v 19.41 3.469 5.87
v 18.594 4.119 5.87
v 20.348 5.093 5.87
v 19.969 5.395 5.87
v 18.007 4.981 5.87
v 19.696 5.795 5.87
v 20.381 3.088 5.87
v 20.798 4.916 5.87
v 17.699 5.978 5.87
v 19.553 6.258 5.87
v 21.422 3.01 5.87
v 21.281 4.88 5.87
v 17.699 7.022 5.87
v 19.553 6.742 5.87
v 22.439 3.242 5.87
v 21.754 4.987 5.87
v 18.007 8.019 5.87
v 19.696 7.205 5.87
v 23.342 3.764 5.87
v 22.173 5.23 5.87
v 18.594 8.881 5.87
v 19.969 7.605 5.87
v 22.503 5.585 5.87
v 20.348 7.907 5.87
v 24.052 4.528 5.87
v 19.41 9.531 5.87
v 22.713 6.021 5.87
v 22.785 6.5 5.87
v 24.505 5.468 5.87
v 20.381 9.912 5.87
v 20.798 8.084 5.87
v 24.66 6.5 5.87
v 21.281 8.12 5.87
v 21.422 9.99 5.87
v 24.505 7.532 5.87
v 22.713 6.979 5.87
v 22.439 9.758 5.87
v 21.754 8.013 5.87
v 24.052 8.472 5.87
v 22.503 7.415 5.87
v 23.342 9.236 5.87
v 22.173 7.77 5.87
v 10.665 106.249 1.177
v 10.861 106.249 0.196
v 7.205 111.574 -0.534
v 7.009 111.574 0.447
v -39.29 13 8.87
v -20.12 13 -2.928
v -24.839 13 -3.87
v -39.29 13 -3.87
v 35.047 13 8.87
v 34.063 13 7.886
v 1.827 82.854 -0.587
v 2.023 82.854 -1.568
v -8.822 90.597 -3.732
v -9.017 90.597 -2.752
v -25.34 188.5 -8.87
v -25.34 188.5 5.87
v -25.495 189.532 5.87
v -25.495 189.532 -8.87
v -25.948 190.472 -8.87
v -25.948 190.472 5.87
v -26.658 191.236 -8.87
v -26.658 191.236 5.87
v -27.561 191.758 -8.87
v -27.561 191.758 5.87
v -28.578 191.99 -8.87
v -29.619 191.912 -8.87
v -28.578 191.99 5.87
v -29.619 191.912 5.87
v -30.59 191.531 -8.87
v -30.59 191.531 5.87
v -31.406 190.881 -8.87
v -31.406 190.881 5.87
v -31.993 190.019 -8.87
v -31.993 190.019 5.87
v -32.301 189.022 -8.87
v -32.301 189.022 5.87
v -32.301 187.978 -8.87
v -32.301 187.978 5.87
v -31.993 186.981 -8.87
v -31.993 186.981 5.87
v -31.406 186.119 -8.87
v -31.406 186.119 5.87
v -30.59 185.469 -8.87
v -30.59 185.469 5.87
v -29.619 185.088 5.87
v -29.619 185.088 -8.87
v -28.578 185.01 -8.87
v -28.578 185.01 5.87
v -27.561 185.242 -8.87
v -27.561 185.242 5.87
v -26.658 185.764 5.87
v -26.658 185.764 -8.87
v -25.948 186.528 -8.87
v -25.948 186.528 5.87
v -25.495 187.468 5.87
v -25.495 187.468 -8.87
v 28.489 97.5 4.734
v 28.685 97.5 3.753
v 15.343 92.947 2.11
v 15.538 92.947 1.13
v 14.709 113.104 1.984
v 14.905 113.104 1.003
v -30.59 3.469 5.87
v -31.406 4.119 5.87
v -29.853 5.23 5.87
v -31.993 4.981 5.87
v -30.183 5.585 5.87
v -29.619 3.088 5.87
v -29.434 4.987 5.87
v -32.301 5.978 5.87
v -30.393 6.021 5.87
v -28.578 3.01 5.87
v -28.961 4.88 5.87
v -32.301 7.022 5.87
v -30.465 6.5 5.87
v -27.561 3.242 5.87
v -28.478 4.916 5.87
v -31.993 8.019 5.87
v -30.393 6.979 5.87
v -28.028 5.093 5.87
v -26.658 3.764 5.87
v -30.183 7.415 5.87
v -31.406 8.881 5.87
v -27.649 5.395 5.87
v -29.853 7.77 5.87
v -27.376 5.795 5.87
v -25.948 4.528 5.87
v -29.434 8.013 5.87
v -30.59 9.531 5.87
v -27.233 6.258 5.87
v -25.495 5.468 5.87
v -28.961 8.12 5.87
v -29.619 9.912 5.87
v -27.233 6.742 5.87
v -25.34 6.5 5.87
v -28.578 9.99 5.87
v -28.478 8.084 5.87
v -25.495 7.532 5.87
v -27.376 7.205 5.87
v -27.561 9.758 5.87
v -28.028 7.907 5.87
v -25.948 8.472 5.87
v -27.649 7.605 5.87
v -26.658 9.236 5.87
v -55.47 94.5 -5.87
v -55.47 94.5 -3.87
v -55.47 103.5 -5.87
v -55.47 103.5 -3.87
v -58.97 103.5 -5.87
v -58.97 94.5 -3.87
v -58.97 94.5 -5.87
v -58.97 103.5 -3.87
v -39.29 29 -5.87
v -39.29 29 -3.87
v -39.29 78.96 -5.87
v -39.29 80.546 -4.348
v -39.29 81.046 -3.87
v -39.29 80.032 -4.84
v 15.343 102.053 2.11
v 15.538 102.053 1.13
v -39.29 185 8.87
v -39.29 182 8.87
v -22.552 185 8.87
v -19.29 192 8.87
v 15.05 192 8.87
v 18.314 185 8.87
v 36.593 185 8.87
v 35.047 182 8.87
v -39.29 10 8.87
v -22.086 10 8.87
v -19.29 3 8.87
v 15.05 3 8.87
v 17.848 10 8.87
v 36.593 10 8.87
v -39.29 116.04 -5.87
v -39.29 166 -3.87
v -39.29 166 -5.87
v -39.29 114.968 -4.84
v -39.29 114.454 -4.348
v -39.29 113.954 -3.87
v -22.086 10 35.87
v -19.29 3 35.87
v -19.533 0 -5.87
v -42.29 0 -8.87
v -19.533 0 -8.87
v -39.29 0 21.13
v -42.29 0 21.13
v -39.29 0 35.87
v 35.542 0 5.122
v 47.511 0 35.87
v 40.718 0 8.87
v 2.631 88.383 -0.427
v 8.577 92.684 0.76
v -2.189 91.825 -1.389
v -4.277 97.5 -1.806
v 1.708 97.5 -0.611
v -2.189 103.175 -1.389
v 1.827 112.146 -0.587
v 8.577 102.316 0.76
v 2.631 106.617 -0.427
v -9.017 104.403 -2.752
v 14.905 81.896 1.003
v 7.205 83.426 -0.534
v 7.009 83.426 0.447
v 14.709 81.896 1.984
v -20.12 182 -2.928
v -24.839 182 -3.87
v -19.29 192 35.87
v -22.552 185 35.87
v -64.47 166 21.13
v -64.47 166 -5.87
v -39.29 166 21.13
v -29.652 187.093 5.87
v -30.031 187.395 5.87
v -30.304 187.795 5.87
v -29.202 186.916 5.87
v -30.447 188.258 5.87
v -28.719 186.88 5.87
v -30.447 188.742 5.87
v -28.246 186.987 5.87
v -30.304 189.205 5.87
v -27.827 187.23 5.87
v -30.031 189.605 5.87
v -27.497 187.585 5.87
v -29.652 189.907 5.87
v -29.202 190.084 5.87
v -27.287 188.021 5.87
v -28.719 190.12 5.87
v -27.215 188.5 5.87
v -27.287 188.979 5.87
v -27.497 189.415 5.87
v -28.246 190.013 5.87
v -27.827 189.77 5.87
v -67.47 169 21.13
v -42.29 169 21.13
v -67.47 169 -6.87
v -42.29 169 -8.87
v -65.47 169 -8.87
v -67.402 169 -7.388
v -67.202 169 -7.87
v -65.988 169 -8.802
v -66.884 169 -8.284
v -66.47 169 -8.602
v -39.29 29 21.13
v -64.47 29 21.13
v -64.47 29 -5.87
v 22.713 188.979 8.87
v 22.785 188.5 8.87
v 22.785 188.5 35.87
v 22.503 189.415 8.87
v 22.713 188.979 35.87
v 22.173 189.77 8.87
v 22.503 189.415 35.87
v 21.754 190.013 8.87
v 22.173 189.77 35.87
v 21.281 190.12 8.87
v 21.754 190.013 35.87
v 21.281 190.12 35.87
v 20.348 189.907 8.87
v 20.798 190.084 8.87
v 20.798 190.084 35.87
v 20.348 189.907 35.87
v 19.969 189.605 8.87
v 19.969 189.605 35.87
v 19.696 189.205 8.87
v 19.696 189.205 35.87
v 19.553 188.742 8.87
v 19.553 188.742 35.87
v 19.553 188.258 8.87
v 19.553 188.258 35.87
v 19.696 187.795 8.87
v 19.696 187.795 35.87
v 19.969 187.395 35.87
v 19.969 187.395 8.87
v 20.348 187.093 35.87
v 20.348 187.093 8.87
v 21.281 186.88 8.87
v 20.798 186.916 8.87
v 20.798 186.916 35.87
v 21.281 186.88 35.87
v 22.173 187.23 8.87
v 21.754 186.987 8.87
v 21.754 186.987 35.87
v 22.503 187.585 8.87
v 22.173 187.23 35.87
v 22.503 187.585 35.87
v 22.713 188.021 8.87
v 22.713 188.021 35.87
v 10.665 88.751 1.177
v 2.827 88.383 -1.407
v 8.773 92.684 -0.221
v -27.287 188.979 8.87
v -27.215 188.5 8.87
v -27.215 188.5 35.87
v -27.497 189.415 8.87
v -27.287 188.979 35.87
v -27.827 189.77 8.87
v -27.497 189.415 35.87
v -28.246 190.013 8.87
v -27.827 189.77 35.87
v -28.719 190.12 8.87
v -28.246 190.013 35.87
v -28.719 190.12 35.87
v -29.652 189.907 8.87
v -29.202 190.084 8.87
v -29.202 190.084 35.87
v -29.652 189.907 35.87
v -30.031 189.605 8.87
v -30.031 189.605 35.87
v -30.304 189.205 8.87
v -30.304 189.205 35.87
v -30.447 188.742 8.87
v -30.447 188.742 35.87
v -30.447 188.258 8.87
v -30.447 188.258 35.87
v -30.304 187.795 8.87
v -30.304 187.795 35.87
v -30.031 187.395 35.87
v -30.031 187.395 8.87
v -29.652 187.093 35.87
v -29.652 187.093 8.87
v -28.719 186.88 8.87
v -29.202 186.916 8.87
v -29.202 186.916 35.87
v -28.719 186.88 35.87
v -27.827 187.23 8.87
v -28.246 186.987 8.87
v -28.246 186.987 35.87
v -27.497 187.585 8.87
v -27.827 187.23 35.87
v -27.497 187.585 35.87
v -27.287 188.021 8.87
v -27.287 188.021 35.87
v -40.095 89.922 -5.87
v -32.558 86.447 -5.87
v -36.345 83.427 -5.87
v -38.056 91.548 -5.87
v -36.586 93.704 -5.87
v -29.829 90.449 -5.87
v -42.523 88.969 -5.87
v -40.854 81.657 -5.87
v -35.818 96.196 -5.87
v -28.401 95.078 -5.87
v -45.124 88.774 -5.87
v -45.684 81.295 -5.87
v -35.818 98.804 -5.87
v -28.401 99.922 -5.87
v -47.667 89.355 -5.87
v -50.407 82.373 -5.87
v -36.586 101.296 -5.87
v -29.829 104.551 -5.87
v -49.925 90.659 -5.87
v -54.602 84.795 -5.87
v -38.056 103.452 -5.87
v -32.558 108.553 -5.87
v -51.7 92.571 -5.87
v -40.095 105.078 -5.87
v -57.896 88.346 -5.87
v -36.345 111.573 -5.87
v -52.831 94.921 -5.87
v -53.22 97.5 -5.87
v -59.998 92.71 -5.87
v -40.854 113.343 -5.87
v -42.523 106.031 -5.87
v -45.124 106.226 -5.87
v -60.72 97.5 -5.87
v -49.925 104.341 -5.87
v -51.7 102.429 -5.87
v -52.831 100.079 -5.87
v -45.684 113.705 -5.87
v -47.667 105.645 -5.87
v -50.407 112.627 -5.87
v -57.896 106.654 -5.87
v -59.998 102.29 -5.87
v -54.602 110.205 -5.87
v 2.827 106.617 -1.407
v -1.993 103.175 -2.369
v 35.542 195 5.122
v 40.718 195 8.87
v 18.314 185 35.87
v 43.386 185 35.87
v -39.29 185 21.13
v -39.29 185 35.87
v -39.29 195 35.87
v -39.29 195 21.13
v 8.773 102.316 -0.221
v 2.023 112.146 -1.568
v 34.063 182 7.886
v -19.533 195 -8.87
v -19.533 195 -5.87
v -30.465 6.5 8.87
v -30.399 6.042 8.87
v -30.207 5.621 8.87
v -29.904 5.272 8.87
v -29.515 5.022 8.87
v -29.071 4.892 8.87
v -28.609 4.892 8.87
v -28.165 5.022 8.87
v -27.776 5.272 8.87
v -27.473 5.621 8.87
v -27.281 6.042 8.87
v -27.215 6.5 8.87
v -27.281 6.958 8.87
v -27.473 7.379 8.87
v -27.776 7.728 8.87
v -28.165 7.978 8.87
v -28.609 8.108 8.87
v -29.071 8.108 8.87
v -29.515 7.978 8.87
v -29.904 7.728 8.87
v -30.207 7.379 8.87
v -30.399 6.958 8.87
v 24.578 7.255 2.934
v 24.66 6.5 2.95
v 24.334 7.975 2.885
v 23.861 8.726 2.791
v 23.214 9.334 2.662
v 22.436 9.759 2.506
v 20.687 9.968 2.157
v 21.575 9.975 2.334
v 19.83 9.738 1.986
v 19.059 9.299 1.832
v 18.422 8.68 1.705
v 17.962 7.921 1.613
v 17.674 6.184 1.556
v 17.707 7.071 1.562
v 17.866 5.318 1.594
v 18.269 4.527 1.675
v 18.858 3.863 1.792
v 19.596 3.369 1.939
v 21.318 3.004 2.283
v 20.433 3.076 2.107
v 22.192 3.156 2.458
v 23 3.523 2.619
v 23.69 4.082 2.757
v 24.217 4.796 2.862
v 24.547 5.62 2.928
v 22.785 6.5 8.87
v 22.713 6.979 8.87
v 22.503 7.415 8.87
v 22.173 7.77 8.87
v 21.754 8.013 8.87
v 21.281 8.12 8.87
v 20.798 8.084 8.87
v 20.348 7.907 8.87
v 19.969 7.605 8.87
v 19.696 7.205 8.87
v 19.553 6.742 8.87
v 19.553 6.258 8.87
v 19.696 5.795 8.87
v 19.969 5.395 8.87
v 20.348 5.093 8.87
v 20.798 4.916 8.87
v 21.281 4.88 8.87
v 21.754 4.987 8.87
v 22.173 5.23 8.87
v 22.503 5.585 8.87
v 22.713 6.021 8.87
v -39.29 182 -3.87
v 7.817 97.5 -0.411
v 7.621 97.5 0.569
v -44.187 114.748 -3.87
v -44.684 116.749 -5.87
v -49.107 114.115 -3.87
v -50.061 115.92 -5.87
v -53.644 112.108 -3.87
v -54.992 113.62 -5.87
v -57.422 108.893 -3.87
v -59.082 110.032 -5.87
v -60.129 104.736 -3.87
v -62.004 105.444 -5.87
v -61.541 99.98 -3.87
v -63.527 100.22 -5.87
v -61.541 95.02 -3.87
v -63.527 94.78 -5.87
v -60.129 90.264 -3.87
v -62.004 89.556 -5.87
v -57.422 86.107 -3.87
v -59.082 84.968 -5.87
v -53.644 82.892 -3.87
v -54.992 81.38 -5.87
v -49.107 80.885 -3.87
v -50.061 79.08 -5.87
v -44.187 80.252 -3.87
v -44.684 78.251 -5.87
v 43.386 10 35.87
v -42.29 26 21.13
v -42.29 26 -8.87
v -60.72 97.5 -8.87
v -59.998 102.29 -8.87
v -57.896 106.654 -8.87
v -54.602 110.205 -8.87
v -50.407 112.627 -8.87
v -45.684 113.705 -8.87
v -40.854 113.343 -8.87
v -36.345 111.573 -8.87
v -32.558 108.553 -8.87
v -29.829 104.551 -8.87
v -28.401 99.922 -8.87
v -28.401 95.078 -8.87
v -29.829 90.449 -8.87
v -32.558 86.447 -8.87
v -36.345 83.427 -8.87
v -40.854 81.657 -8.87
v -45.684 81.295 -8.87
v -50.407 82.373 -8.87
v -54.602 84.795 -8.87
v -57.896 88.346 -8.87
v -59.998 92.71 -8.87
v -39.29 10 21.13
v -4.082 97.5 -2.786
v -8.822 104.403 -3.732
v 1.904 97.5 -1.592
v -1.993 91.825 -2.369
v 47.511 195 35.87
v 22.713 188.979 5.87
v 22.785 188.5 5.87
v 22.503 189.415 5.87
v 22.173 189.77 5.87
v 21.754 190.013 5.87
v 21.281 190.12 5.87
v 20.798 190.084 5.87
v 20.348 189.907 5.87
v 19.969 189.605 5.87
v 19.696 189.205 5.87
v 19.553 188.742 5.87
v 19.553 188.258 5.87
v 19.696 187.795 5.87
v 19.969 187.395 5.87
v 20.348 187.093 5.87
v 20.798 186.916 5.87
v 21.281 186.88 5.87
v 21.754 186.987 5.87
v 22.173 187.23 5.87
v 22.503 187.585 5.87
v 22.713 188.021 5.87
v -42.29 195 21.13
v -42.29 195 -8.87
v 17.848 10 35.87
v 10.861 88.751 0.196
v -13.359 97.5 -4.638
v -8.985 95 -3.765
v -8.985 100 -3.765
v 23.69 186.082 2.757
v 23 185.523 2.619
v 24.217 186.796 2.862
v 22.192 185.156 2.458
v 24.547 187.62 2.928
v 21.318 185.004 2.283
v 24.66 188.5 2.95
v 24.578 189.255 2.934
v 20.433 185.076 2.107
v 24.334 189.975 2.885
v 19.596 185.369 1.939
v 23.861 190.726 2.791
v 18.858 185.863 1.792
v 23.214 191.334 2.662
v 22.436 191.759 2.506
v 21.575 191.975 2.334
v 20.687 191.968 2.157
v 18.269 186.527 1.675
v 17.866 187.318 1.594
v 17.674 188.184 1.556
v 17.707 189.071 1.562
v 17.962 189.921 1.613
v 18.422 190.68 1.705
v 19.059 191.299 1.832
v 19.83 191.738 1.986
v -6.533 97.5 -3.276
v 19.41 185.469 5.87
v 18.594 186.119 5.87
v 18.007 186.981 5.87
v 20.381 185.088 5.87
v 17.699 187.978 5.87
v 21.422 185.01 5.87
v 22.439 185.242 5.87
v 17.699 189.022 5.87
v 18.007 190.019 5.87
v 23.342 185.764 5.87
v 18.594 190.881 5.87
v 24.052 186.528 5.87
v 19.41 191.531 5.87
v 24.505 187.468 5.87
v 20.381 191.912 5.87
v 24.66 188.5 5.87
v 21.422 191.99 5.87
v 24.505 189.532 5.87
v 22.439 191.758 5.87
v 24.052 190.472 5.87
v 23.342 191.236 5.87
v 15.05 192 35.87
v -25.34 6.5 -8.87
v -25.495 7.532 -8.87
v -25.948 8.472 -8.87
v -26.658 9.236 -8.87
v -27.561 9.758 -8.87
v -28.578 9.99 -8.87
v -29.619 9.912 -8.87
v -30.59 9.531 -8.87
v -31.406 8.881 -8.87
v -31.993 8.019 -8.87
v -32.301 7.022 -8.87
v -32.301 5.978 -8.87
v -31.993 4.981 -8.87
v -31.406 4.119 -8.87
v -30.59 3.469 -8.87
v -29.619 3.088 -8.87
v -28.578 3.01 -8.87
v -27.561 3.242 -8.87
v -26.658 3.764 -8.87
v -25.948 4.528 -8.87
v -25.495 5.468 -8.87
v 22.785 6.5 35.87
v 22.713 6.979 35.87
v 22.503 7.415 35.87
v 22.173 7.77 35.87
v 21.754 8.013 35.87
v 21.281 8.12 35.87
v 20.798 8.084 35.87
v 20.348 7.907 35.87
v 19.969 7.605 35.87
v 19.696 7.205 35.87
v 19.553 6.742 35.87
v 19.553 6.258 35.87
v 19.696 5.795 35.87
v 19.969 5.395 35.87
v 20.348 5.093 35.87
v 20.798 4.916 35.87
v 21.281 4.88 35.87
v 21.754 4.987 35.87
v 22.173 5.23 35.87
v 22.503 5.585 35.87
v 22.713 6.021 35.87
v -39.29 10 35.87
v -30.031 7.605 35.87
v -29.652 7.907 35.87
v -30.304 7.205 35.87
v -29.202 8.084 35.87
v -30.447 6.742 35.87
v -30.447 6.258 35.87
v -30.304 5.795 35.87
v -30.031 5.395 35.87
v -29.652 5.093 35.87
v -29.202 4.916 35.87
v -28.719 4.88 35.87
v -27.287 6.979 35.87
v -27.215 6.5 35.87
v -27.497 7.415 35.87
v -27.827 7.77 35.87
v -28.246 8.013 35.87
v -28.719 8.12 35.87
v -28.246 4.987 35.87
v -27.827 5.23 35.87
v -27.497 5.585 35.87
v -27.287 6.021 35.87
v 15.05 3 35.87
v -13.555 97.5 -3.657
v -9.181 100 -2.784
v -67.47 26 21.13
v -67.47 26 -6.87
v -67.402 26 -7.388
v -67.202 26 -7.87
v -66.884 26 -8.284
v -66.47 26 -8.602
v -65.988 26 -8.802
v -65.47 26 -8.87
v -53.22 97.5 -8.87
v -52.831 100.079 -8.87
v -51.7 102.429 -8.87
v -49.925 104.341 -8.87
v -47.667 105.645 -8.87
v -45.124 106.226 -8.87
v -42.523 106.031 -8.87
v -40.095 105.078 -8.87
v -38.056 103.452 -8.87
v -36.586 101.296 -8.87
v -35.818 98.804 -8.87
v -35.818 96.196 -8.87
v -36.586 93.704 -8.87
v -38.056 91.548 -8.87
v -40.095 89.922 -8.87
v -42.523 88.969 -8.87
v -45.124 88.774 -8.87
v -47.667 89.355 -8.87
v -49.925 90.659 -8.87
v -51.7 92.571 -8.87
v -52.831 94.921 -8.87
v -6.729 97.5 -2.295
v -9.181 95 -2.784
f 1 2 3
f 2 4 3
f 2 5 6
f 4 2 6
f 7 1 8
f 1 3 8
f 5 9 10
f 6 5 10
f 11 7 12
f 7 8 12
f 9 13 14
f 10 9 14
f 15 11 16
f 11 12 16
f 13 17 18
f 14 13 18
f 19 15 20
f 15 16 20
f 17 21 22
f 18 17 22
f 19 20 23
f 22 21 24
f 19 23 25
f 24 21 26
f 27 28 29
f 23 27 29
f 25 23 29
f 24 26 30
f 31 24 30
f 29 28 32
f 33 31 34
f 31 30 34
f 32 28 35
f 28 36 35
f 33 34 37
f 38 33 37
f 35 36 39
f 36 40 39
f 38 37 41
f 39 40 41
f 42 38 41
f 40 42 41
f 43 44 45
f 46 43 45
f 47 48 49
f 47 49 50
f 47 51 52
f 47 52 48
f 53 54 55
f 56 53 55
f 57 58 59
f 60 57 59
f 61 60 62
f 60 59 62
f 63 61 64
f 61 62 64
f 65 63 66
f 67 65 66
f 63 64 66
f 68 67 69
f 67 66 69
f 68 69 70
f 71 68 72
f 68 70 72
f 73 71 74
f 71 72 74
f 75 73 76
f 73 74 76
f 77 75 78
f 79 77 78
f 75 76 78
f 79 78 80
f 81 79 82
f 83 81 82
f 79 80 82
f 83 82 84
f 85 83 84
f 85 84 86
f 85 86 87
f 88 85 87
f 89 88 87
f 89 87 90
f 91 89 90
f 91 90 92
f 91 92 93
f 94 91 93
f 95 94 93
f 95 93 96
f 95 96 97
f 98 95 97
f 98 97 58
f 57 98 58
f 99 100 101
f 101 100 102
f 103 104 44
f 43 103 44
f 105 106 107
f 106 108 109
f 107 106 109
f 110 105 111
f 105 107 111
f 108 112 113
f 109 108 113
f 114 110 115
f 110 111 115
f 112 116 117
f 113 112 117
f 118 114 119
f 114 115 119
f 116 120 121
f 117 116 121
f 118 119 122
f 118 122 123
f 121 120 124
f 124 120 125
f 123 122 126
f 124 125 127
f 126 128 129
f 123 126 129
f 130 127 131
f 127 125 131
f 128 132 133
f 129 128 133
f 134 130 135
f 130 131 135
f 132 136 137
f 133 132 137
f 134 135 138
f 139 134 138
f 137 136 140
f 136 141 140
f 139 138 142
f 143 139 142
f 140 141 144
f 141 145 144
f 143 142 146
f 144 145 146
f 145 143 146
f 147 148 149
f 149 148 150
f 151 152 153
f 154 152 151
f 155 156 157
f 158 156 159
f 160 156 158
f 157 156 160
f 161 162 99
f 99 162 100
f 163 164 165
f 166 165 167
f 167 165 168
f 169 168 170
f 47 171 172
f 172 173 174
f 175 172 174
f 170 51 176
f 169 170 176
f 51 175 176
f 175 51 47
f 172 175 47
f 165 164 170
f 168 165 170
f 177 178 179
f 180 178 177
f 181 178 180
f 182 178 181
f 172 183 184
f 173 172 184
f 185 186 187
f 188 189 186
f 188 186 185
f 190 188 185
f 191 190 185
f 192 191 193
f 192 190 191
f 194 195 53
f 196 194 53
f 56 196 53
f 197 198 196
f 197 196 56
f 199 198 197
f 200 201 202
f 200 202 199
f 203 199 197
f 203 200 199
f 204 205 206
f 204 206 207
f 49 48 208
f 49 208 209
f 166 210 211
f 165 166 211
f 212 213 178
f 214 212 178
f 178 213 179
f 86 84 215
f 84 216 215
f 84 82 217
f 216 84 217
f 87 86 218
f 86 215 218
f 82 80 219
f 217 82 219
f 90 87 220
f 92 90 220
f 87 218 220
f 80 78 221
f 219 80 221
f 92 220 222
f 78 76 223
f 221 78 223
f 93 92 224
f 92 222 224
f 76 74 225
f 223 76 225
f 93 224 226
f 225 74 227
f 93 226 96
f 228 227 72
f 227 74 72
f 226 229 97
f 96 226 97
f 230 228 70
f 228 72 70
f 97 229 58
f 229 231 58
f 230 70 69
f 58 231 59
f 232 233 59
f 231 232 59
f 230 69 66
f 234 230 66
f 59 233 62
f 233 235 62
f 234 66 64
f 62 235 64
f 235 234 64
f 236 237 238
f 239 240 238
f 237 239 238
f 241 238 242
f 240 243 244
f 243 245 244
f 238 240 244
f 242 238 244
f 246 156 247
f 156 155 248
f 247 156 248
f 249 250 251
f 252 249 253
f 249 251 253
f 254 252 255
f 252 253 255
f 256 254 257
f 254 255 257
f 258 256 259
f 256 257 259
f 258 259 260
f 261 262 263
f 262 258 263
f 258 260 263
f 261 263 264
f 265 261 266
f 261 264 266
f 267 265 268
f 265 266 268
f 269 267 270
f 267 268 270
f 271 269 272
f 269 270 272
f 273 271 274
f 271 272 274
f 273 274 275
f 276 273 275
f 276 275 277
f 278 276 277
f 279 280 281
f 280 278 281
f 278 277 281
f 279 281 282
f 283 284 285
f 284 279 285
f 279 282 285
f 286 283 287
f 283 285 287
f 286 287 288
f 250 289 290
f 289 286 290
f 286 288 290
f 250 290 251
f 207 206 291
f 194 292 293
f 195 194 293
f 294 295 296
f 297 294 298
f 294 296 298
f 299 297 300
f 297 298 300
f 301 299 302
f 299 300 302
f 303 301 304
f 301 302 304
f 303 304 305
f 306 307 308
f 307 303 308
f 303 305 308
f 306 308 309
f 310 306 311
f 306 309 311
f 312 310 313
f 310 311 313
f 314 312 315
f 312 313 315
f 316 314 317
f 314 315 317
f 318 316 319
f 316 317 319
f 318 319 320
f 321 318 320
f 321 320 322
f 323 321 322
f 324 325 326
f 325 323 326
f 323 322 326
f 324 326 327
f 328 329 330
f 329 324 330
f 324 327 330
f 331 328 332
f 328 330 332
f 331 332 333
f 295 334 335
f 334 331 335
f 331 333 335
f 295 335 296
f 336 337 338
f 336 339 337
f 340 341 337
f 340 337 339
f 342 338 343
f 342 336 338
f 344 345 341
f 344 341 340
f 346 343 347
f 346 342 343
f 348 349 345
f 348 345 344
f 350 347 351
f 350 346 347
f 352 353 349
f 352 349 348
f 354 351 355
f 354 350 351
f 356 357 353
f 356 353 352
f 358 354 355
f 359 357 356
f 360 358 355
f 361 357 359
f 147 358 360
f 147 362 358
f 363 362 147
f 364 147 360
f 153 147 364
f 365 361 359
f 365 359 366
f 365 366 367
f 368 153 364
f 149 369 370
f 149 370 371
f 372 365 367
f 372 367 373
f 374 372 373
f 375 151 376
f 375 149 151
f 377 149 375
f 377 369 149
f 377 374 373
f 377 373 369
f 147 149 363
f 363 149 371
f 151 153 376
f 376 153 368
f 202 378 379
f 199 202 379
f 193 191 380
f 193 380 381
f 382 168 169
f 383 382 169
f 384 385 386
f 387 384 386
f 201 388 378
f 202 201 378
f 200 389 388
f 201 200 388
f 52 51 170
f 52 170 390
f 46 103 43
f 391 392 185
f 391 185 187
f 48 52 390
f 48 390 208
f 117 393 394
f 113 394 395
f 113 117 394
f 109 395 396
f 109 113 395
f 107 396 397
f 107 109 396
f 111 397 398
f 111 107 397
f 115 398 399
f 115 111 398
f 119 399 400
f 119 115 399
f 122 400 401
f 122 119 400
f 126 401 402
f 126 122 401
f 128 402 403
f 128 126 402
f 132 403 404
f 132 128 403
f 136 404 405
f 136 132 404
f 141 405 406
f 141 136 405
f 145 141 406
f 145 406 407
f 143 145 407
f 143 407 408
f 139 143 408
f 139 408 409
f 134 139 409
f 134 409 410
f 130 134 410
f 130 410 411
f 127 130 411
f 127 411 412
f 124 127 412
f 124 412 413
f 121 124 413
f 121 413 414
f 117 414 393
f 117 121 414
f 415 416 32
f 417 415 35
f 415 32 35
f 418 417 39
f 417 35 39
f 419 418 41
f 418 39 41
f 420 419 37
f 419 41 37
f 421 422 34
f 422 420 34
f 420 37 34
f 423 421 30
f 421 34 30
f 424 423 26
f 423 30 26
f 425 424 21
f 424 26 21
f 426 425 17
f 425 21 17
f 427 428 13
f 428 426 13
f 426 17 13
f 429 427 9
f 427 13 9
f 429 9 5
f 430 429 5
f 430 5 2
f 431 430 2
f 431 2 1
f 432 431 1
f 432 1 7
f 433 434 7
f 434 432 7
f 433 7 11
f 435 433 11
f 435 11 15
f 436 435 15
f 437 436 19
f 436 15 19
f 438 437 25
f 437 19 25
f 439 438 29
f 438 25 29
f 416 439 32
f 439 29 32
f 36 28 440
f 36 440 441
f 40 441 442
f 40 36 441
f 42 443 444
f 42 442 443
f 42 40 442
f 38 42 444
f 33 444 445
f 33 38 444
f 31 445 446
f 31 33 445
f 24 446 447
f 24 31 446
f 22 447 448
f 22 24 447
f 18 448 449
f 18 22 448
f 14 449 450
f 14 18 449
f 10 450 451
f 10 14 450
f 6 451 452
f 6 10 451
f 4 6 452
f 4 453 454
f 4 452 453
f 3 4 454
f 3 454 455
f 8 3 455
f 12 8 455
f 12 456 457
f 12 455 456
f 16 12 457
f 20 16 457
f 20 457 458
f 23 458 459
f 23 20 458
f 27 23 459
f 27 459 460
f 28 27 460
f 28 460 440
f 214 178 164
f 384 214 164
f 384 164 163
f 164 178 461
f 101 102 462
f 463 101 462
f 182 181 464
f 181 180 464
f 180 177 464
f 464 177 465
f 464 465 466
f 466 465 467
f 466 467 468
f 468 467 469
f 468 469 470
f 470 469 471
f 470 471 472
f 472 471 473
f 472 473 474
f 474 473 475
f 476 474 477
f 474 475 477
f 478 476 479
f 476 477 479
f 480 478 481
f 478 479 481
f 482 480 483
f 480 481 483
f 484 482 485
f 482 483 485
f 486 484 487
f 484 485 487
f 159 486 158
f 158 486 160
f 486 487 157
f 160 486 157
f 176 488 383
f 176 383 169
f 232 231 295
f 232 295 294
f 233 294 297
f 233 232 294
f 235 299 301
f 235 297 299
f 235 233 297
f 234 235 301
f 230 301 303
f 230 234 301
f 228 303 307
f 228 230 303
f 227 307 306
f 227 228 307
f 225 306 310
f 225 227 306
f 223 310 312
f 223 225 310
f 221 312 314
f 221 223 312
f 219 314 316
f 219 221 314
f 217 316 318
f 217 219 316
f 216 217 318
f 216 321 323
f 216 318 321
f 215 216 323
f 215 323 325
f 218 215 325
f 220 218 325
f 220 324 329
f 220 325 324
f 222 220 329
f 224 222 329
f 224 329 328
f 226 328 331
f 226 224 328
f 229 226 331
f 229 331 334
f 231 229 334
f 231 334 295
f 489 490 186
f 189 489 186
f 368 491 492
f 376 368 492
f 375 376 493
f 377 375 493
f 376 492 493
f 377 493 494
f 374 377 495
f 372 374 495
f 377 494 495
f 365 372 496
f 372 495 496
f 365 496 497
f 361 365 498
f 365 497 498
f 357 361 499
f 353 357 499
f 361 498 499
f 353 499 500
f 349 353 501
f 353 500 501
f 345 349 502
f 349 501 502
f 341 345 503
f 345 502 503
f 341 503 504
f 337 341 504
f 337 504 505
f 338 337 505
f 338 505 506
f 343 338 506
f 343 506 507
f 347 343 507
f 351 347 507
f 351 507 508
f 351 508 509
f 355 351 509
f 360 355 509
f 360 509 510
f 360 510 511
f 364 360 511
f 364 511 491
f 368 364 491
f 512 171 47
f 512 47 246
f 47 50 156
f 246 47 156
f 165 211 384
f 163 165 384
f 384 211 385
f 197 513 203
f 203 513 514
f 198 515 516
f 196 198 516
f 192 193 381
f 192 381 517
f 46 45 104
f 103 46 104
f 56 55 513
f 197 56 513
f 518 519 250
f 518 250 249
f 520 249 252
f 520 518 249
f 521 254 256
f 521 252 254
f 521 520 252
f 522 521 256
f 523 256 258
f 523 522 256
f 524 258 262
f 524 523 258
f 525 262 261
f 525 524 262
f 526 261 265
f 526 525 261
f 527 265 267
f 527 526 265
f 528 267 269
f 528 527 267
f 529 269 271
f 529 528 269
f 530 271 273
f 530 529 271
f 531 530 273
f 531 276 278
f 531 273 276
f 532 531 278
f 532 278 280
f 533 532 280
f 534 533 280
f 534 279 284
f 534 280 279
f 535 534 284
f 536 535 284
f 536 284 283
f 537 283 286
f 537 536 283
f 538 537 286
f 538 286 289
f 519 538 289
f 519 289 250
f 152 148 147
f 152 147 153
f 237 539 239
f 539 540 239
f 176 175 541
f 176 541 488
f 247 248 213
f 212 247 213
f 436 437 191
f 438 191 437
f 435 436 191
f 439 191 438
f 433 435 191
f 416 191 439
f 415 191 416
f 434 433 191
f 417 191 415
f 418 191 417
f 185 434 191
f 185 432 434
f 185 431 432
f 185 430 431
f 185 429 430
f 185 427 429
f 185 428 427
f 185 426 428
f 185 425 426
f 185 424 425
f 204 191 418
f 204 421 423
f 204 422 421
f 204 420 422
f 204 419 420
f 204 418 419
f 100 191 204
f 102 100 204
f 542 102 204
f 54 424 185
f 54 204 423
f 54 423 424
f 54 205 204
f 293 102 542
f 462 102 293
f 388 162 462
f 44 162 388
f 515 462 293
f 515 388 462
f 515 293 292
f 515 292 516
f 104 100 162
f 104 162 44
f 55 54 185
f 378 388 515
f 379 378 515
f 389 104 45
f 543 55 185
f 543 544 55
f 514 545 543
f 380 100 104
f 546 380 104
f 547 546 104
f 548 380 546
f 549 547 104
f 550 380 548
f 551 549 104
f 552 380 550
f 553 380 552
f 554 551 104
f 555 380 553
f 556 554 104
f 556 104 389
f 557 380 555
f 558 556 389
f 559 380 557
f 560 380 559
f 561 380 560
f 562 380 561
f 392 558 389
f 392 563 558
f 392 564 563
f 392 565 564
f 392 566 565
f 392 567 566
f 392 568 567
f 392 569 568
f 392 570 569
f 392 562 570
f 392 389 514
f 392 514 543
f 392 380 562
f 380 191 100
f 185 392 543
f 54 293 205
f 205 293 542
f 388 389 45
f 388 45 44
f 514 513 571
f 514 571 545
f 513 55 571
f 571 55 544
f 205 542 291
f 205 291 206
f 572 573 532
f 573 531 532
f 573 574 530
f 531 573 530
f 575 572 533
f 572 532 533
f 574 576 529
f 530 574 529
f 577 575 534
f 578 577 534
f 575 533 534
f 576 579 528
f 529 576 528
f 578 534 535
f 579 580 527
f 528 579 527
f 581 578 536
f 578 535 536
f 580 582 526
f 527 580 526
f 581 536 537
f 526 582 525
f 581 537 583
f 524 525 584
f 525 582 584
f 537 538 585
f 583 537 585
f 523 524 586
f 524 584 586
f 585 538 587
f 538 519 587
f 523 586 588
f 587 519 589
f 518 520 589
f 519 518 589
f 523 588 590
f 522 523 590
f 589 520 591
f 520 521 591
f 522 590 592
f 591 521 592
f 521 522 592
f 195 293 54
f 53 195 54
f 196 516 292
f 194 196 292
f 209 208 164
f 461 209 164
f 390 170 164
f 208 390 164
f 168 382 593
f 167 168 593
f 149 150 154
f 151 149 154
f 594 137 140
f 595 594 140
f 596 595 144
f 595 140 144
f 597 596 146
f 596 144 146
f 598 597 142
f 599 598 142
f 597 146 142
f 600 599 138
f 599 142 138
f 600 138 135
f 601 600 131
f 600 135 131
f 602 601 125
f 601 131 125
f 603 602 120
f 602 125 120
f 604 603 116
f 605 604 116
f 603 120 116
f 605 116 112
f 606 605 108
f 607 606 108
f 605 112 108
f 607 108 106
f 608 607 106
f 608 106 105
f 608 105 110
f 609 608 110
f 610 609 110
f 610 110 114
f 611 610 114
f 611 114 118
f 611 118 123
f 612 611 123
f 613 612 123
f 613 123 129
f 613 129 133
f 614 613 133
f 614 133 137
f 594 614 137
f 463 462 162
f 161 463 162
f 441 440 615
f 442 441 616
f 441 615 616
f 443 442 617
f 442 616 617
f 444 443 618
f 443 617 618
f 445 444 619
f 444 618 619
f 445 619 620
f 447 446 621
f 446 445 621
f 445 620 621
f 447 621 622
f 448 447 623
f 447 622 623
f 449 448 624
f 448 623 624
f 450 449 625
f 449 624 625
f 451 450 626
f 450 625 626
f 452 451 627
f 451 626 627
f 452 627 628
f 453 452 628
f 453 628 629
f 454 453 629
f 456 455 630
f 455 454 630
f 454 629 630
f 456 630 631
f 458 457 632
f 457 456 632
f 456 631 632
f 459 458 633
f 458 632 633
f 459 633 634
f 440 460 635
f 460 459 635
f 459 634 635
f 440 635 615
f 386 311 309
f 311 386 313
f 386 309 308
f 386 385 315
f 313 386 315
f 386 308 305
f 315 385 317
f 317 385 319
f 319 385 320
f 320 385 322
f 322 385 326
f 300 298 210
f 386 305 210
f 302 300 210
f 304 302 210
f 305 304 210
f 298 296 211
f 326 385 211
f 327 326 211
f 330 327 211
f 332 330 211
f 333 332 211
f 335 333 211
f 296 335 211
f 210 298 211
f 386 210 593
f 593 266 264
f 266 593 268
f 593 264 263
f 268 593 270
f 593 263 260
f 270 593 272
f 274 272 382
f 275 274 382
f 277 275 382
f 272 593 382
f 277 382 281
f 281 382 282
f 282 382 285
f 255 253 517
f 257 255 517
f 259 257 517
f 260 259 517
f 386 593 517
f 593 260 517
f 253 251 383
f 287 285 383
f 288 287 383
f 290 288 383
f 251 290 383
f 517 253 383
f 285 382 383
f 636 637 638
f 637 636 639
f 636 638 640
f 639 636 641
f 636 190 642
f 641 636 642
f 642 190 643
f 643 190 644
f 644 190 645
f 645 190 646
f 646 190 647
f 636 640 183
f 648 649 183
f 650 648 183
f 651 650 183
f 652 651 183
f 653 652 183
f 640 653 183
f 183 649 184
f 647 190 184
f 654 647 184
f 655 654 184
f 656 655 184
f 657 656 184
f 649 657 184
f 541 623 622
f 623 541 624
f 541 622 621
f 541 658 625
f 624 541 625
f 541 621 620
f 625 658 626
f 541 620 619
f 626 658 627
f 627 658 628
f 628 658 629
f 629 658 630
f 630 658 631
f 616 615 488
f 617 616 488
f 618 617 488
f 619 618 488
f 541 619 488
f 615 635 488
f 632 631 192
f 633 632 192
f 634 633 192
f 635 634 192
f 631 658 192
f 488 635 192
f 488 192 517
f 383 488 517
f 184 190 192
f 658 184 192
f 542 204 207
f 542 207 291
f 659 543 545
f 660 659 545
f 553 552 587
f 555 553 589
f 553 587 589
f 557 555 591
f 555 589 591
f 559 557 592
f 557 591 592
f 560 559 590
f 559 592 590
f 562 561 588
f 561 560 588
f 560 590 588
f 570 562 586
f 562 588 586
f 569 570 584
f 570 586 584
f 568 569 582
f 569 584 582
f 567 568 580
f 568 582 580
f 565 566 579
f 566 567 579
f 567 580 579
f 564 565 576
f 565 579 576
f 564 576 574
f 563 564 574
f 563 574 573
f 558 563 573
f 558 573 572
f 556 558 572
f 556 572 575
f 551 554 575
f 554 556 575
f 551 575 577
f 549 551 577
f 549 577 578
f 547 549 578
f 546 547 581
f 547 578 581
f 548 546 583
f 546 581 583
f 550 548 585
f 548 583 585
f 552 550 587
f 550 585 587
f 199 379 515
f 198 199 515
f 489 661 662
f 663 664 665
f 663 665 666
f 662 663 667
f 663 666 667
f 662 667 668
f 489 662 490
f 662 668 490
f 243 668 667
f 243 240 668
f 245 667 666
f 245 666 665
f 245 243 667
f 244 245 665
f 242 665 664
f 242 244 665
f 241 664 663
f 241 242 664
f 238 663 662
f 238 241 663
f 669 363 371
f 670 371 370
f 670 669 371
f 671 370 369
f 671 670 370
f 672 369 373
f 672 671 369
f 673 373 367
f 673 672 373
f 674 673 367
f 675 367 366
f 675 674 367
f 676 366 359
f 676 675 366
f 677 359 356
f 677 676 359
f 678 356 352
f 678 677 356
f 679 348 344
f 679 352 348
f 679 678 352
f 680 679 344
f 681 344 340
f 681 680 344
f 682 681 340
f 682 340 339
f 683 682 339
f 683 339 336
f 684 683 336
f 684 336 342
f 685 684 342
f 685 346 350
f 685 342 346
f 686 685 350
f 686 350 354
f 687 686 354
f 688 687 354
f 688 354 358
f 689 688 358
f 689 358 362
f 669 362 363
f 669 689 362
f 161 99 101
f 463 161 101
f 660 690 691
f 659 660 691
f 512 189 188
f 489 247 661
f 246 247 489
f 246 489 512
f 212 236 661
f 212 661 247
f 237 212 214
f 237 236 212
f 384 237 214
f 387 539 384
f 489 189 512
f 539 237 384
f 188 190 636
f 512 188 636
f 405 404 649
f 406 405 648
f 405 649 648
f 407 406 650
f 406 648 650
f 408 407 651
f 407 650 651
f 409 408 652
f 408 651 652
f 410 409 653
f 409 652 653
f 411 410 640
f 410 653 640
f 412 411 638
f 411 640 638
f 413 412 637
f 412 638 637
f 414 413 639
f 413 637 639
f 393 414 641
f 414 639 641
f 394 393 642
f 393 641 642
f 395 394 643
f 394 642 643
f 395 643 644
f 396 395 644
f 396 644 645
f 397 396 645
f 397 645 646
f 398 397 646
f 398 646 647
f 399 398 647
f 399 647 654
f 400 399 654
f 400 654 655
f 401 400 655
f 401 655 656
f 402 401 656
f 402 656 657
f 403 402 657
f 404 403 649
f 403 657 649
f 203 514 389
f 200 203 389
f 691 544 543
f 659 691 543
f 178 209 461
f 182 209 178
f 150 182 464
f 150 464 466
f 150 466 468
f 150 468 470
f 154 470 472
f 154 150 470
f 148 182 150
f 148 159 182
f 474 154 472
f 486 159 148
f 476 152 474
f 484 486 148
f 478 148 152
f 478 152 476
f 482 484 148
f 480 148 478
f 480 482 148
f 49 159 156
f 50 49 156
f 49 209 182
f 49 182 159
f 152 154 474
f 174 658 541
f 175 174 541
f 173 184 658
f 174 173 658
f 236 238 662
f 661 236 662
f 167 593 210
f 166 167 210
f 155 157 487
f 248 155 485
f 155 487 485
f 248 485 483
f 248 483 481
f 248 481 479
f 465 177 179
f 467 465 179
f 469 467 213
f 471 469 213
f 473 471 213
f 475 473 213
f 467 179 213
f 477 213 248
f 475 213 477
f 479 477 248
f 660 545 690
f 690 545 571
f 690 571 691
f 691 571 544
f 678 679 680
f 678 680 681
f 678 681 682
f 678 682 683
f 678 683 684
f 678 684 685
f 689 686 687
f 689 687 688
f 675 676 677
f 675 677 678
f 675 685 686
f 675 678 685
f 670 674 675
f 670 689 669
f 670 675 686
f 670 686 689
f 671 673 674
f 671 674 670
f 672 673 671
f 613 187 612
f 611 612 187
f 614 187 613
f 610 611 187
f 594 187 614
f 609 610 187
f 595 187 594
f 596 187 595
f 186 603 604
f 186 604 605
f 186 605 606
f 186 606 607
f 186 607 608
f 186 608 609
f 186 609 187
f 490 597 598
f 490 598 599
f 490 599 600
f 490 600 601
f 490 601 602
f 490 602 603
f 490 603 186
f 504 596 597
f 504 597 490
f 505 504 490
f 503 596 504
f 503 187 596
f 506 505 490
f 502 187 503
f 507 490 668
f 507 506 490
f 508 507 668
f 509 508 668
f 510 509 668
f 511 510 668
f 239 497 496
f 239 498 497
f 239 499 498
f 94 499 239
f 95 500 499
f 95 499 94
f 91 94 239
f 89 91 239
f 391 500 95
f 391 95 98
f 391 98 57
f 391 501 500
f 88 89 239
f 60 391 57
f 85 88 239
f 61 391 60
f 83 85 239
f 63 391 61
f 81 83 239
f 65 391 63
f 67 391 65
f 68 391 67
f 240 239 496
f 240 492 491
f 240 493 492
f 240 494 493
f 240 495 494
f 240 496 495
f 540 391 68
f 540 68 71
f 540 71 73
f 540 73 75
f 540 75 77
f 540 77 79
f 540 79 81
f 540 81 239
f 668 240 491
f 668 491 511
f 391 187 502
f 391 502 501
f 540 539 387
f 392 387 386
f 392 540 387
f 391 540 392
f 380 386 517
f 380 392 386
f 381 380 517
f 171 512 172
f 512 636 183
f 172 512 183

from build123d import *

# Parameters (mm, degrees)
CROQUIS1_W                 = 78.58
CROQUIS1_H                 = 17.74
SALIENTE_EXTRUIR1_DEPTH    = 195
CORTAR_EXTRUIR1_DEPTH      = 200.116501074
CORTAR_EXTRUIR1_DEPTH_BACK = 200.116501074
CHAFL_N1_SIZE2             = 3.821967962
CHAFL_N1_SIZE              = 3
CROQUIS4_W                 = 3
CROQUIS4_H                 = 195
SALIENTE_EXTRUIR2_DEPTH    = 3
CROQUIS5_W                 = 25.18
CROQUIS5_H                 = 143
SALIENTE_EXTRUIR3_DEPTH    = 3
REDONDEO1_R                = 2
CORTAR_EXTRUIR2_DEPTH      = 208.103617786
CORTAR_EXTRUIR2_DEPTH_BACK = 208.103617786
CROQUIS6_R                 = 1.625
CORTAR_EXTRUIR3_START      = -3
CROQUIS7_R                 = 3.5
CORTAR_EXTRUIR3_DEPTH      = 205.103617786
CROQUIS8_R                 = 16.25
CROQUIS8_R_2               = 8.75
CORTAR_EXTRUIR4_DEPTH      = 3
CROQUIS9_R                 = 17.25
SALIENTE_EXTRUIR4_DEPTH    = 2
CHAFL_N2_SIZE              = 2
CORTAR_EXTRUIR6_DEPTH      = 208.103617786
CORTAR_EXTRUIR6_DEPTH_BACK = 208.103617786
CROQUIS10_W                = 3.5
CROQUIS10_H                = 9
CORTAR_EXTRUIR7_DEPTH      = 1
CORTAR_EXTRUIR8_START      = -13
CORTAR_EXTRUIR8_DEPTH      = 169
SALIENTE_EXTRUIR6_START    = 27
CROQUIS16_R                = 1.625
SALIENTE_EXTRUIR6_DEPTH    = 27
SALIENTE_EXTRUIR9_DEPTH    = 27
SALIENTE_EXTRUIR10_DEPTH   = 195
SALIENTE_EXTRUIR11_START   = -10
SALIENTE_EXTRUIR11_DEPTH   = 10
SALIENTE_EXTRUIR12_START   = -10
SALIENTE_EXTRUIR12_DEPTH   = 10


# Read off the part's stored shape, not the designer's step: Saliente-Extruir11, Saliente-Extruir12
with BuildPart() as part:
    # Croquis1 → Saliente-Extruir1 (new body)
    with BuildSketch(Plane(origin=(0, 0, 0), x_dir=(1, 0, 0), z_dir=(0, 1, 0))):
        Rectangle(CROQUIS1_W, CROQUIS1_H)
    extrude(amount=SALIENTE_EXTRUIR1_DEPTH)

    # Croquis2 → Cortar-Extruir1 (cut, two sides: drawn at the far end of the back side and taken through both)
    with BuildSketch(Plane.XZ.offset(-CORTAR_EXTRUIR1_DEPTH_BACK)):
        Polygon((39.29, 5.87), (-19.532543769, -5.87), (-19.532543769, -8.87), (39.29, -8.87), align=None)
    extrude(amount=CORTAR_EXTRUIR1_DEPTH + CORTAR_EXTRUIR1_DEPTH_BACK, mode=Mode.SUBTRACT)

    # Chaflán1
    chafl_n1_edges = [part.edges().sort_by_distance(p)[0] for p in [
        (39.29, 97.5, 5.87),
    ]]
    chafl_n1_side = [part.faces().sort_by_distance(p)[0] for p in [
        (39.29, 97.5, 5.93),
    ]]
    chamfer(chafl_n1_edges, length=CHAFL_N1_SIZE - 0.0001, length2=CHAFL_N1_SIZE2 - 0.0001, reference=chafl_n1_side[0])  # a hair under: the kernel refuses the full size

    # Croquis4 → Saliente-Extruir2 (add)
    with BuildSketch(Plane(origin=(0, 0, -8.87), x_dir=(-1, 0, 0), z_dir=(0, 0, -1))):
        with Locations((40.79, 97.5)):
            Rectangle(CROQUIS4_W, CROQUIS4_H)
    extrude(amount=-SALIENTE_EXTRUIR2_DEPTH)

    # Croquis5 → Saliente-Extruir3 (add)
    with BuildSketch(Plane(origin=(0, 0, -8.87), x_dir=(-1, 0, 0), z_dir=(0, 0, -1))):
        with Locations((54.88, 97.5)):
            Rectangle(CROQUIS5_W, CROQUIS5_H)
    extrude(amount=-SALIENTE_EXTRUIR3_DEPTH)

    # Redondeo1
    redondeo1_edges = [part.edges().sort_by_distance(p)[0] for p in [
        (-67.47, 97.5, -8.87),
    ]]
    fillet(redondeo1_edges, radius=REDONDEO1_R)

    # Croquis6 → Cortar-Extruir2 (cut, two sides: drawn at the far end of the back side and taken through both)
    with BuildSketch(Plane.XY.offset(8.87).offset(-CORTAR_EXTRUIR2_DEPTH_BACK)):
        with Locations((-28.84, 188.5)):
            Circle(CROQUIS6_R)
        with Locations((21.16, 188.5)):
            Circle(CROQUIS6_R)
        with Locations((21.16, 6.5)):
            Circle(CROQUIS6_R)
        with Locations(Location((-28.84, 6.5, 0), (0, 0, 180))):
            Circle(CROQUIS6_R)
    extrude(amount=CORTAR_EXTRUIR2_DEPTH + CORTAR_EXTRUIR2_DEPTH_BACK, mode=Mode.SUBTRACT)

    # Croquis7 → Cortar-Extruir3 (cut, through all)
    with BuildSketch(Plane.XY.offset(8.87).offset(CORTAR_EXTRUIR3_START)):
        with Locations((-28.84, 188.5)):
            Circle(CROQUIS7_R)
        with Locations((21.16, 188.5)):
            Circle(CROQUIS7_R)
        with Locations((-28.84, 6.5)):
            Circle(CROQUIS7_R)
        with Locations((21.16, 6.5)):
            Circle(CROQUIS7_R)
    extrude(amount=-CORTAR_EXTRUIR3_DEPTH, mode=Mode.SUBTRACT)

    # Croquis8 → Cortar-Extruir4 (cut)
    with BuildSketch(Plane(origin=(0, 0, -8.87), x_dir=(-1, 0, 0), z_dir=(0, 0, -1))):
        with Locations((44.469949206, 97.5)):
            Circle(CROQUIS8_R)
        with Locations((44.469949206, 97.5)):
            Circle(CROQUIS8_R_2, mode=Mode.SUBTRACT)
    extrude(amount=-CORTAR_EXTRUIR4_DEPTH, mode=Mode.SUBTRACT)

    # Croquis9 → Saliente-Extruir4 (add)
    with BuildSketch(Plane.XY.offset(-5.87)):
        with Locations((-44.469949206, 97.5)):
            Circle(CROQUIS9_R)
    extrude(amount=SALIENTE_EXTRUIR4_DEPTH)

    # Chaflán2
    chafl_n2_edges = [part.edges().sort_by_distance(p)[0] for p in [
        (-61.719949206, 97.5, -5.87),
    ]]
    chamfer(chafl_n2_edges, length=CHAFL_N2_SIZE - 0.0001)  # a hair under: the kernel refuses the full size

    # Croquis10 → Cortar-Extruir6 (cut, two sides: drawn at the far end of the back side and taken through both)
    with BuildSketch(Plane(origin=(0, 0, -8.87), x_dir=(-1, 0, 0), z_dir=(0, 0, -1)).offset(-CORTAR_EXTRUIR6_DEPTH_BACK)):
        with Locations((57.22, 99)):
            Rectangle(CROQUIS10_W, CROQUIS10_H)
    extrude(amount=CORTAR_EXTRUIR6_DEPTH + CORTAR_EXTRUIR6_DEPTH_BACK, mode=Mode.SUBTRACT)

    # Croquis11 → Cortar-Extruir7 (cut)
    with BuildSketch(Plane(origin=(0.378430223, 0, -1.896101224), x_dir=(-0.9806591733939511, 0, -0.1957232373487947), z_dir=(0.19572323734879468, 0, -0.980659173393951))):
        Polygon((-28.864838216, 97.5), (-15.458781877, 92.947300595), (-7.58538371, 97.5), (-15.458781877, 102.052699405), align=None)
        Polygon((-10.689272405, 88.750905342), (-6.961025568, 83.426417054), (-14.813228871, 81.895762524), align=None)
        Polygon((-8.5598171, 92.683515176), (-1.676899864, 82.853690645), (9.381652734, 90.596972535), (4.548100867, 97.5), (9.381652734, 104.403027465), (-1.676899864, 112.146309355), (-8.5598171, 102.316484824), (-2.496901935, 106.616608043), (2.418010331, 103.175149425), (-1.555772077, 97.5), (2.418010331, 91.824850575), (-2.496901935, 88.383391957), align=None)
        Polygon((7.048100867, 97.5), (9.548100867, 95), (14.008259291, 97.5), (9.548100867, 100), align=None)
        Polygon((-14.813228871, 113.104237476), (-10.689272405, 106.249094658), (-6.961025568, 111.573582946), align=None)
    extrude(amount=-CORTAR_EXTRUIR7_DEPTH, mode=Mode.SUBTRACT)

    # Croquis12 → Cortar-Extruir8 (cut)
    with BuildSketch(Plane.XZ.offset(CORTAR_EXTRUIR8_START)):
        Polygon((-20.119713481, -2.92802248), (-24.839433576, -3.87), (-39.29, -3.87), (-39.29, 8.87), (35.047359313, 8.87), (34.063379787, 7.886020474), align=None)
    extrude(amount=-CORTAR_EXTRUIR8_DEPTH, mode=Mode.SUBTRACT)

    # Croquis16 → Saliente-Extruir6 (add)
    # profile 1 of 2: a face of its own
    with BuildSketch(Plane.XY.offset(8.87).offset(SALIENTE_EXTRUIR6_START)):
        Polygon((15.05, 3), (17.847845949, 10), (35.05, 10), (35.05, 0), (15.05, 0), (-19.29, 0), (-39.29, 0), (-39.29, 10), (-22.086, 10), (-19.29, 3), align=None)
        with Locations((-28.84, 6.5)):
            Circle(CROQUIS16_R, mode=Mode.SUBTRACT)
        with Locations((21.16, 6.5)):
            Circle(CROQUIS16_R, mode=Mode.SUBTRACT)
    # profile 2 of 2: a face of its own
    with BuildSketch(Plane.XY.offset(8.87).offset(SALIENTE_EXTRUIR6_START)):
        Polygon((-39.29, 195), (-19.29, 195), (15.05, 195), (35.05, 195), (35.05, 185), (18.314153607, 185), (15.05, 192), (-19.29, 192), (-22.552, 185), (-39.29, 185), align=None)
        with Locations((-28.84, 188.5)):
            Circle(CROQUIS16_R, mode=Mode.SUBTRACT)
        with Locations((21.16, 188.5)):
            Circle(CROQUIS16_R, mode=Mode.SUBTRACT)
    extrude(amount=-SALIENTE_EXTRUIR6_DEPTH)

    # Croquis19 → Saliente-Extruir9 (add)
    with BuildSketch(Plane.XY.offset(-5.87)):
        Polygon((-42.29, 26), (-42.29, 0), (-39.29, 0), (-39.29, 26), (-39.29, 29), (-64.47, 29), (-64.47, 166), (-39.29, 166), (-39.29, 195), (-42.29, 195), (-42.29, 169), (-67.47, 169), (-67.47, 26), align=None)
    extrude(amount=SALIENTE_EXTRUIR9_DEPTH)

    # Croquis20 → Saliente-Extruir10 (add)
    with BuildSketch(Plane.XZ):
        Polygon((47.510578309, 35.87), (43.385937322, 35.87), (36.593333228, 8.87), (35.541952057, 5.121952057), (40.717974215, 8.87), align=None)
    extrude(amount=-SALIENTE_EXTRUIR10_DEPTH)

    # Saliente-Extruir11 outline → Saliente-Extruir11 (add)
    with BuildSketch(Plane.XZ.offset(SALIENTE_EXTRUIR11_START)):
        Polygon((36.593333228, 8.87), (43.385937322, 35.87), (35.05, 35.87), (35.05, 8.87), align=None)
    extrude(amount=SALIENTE_EXTRUIR11_DEPTH)

    # Saliente-Extruir12 outline → Saliente-Extruir12 (add)
    with BuildSketch(Plane(origin=(0, 195, 0), x_dir=(1, 0, 0), z_dir=(0, 1, 0)).offset(SALIENTE_EXTRUIR12_START)):
        Polygon((35.05, -35.87), (43.385937322, -35.87), (36.593333228, -8.87), (35.05, -8.87), align=None)
    extrude(amount=SALIENTE_EXTRUIR12_DEPTH)


solid = part.part
